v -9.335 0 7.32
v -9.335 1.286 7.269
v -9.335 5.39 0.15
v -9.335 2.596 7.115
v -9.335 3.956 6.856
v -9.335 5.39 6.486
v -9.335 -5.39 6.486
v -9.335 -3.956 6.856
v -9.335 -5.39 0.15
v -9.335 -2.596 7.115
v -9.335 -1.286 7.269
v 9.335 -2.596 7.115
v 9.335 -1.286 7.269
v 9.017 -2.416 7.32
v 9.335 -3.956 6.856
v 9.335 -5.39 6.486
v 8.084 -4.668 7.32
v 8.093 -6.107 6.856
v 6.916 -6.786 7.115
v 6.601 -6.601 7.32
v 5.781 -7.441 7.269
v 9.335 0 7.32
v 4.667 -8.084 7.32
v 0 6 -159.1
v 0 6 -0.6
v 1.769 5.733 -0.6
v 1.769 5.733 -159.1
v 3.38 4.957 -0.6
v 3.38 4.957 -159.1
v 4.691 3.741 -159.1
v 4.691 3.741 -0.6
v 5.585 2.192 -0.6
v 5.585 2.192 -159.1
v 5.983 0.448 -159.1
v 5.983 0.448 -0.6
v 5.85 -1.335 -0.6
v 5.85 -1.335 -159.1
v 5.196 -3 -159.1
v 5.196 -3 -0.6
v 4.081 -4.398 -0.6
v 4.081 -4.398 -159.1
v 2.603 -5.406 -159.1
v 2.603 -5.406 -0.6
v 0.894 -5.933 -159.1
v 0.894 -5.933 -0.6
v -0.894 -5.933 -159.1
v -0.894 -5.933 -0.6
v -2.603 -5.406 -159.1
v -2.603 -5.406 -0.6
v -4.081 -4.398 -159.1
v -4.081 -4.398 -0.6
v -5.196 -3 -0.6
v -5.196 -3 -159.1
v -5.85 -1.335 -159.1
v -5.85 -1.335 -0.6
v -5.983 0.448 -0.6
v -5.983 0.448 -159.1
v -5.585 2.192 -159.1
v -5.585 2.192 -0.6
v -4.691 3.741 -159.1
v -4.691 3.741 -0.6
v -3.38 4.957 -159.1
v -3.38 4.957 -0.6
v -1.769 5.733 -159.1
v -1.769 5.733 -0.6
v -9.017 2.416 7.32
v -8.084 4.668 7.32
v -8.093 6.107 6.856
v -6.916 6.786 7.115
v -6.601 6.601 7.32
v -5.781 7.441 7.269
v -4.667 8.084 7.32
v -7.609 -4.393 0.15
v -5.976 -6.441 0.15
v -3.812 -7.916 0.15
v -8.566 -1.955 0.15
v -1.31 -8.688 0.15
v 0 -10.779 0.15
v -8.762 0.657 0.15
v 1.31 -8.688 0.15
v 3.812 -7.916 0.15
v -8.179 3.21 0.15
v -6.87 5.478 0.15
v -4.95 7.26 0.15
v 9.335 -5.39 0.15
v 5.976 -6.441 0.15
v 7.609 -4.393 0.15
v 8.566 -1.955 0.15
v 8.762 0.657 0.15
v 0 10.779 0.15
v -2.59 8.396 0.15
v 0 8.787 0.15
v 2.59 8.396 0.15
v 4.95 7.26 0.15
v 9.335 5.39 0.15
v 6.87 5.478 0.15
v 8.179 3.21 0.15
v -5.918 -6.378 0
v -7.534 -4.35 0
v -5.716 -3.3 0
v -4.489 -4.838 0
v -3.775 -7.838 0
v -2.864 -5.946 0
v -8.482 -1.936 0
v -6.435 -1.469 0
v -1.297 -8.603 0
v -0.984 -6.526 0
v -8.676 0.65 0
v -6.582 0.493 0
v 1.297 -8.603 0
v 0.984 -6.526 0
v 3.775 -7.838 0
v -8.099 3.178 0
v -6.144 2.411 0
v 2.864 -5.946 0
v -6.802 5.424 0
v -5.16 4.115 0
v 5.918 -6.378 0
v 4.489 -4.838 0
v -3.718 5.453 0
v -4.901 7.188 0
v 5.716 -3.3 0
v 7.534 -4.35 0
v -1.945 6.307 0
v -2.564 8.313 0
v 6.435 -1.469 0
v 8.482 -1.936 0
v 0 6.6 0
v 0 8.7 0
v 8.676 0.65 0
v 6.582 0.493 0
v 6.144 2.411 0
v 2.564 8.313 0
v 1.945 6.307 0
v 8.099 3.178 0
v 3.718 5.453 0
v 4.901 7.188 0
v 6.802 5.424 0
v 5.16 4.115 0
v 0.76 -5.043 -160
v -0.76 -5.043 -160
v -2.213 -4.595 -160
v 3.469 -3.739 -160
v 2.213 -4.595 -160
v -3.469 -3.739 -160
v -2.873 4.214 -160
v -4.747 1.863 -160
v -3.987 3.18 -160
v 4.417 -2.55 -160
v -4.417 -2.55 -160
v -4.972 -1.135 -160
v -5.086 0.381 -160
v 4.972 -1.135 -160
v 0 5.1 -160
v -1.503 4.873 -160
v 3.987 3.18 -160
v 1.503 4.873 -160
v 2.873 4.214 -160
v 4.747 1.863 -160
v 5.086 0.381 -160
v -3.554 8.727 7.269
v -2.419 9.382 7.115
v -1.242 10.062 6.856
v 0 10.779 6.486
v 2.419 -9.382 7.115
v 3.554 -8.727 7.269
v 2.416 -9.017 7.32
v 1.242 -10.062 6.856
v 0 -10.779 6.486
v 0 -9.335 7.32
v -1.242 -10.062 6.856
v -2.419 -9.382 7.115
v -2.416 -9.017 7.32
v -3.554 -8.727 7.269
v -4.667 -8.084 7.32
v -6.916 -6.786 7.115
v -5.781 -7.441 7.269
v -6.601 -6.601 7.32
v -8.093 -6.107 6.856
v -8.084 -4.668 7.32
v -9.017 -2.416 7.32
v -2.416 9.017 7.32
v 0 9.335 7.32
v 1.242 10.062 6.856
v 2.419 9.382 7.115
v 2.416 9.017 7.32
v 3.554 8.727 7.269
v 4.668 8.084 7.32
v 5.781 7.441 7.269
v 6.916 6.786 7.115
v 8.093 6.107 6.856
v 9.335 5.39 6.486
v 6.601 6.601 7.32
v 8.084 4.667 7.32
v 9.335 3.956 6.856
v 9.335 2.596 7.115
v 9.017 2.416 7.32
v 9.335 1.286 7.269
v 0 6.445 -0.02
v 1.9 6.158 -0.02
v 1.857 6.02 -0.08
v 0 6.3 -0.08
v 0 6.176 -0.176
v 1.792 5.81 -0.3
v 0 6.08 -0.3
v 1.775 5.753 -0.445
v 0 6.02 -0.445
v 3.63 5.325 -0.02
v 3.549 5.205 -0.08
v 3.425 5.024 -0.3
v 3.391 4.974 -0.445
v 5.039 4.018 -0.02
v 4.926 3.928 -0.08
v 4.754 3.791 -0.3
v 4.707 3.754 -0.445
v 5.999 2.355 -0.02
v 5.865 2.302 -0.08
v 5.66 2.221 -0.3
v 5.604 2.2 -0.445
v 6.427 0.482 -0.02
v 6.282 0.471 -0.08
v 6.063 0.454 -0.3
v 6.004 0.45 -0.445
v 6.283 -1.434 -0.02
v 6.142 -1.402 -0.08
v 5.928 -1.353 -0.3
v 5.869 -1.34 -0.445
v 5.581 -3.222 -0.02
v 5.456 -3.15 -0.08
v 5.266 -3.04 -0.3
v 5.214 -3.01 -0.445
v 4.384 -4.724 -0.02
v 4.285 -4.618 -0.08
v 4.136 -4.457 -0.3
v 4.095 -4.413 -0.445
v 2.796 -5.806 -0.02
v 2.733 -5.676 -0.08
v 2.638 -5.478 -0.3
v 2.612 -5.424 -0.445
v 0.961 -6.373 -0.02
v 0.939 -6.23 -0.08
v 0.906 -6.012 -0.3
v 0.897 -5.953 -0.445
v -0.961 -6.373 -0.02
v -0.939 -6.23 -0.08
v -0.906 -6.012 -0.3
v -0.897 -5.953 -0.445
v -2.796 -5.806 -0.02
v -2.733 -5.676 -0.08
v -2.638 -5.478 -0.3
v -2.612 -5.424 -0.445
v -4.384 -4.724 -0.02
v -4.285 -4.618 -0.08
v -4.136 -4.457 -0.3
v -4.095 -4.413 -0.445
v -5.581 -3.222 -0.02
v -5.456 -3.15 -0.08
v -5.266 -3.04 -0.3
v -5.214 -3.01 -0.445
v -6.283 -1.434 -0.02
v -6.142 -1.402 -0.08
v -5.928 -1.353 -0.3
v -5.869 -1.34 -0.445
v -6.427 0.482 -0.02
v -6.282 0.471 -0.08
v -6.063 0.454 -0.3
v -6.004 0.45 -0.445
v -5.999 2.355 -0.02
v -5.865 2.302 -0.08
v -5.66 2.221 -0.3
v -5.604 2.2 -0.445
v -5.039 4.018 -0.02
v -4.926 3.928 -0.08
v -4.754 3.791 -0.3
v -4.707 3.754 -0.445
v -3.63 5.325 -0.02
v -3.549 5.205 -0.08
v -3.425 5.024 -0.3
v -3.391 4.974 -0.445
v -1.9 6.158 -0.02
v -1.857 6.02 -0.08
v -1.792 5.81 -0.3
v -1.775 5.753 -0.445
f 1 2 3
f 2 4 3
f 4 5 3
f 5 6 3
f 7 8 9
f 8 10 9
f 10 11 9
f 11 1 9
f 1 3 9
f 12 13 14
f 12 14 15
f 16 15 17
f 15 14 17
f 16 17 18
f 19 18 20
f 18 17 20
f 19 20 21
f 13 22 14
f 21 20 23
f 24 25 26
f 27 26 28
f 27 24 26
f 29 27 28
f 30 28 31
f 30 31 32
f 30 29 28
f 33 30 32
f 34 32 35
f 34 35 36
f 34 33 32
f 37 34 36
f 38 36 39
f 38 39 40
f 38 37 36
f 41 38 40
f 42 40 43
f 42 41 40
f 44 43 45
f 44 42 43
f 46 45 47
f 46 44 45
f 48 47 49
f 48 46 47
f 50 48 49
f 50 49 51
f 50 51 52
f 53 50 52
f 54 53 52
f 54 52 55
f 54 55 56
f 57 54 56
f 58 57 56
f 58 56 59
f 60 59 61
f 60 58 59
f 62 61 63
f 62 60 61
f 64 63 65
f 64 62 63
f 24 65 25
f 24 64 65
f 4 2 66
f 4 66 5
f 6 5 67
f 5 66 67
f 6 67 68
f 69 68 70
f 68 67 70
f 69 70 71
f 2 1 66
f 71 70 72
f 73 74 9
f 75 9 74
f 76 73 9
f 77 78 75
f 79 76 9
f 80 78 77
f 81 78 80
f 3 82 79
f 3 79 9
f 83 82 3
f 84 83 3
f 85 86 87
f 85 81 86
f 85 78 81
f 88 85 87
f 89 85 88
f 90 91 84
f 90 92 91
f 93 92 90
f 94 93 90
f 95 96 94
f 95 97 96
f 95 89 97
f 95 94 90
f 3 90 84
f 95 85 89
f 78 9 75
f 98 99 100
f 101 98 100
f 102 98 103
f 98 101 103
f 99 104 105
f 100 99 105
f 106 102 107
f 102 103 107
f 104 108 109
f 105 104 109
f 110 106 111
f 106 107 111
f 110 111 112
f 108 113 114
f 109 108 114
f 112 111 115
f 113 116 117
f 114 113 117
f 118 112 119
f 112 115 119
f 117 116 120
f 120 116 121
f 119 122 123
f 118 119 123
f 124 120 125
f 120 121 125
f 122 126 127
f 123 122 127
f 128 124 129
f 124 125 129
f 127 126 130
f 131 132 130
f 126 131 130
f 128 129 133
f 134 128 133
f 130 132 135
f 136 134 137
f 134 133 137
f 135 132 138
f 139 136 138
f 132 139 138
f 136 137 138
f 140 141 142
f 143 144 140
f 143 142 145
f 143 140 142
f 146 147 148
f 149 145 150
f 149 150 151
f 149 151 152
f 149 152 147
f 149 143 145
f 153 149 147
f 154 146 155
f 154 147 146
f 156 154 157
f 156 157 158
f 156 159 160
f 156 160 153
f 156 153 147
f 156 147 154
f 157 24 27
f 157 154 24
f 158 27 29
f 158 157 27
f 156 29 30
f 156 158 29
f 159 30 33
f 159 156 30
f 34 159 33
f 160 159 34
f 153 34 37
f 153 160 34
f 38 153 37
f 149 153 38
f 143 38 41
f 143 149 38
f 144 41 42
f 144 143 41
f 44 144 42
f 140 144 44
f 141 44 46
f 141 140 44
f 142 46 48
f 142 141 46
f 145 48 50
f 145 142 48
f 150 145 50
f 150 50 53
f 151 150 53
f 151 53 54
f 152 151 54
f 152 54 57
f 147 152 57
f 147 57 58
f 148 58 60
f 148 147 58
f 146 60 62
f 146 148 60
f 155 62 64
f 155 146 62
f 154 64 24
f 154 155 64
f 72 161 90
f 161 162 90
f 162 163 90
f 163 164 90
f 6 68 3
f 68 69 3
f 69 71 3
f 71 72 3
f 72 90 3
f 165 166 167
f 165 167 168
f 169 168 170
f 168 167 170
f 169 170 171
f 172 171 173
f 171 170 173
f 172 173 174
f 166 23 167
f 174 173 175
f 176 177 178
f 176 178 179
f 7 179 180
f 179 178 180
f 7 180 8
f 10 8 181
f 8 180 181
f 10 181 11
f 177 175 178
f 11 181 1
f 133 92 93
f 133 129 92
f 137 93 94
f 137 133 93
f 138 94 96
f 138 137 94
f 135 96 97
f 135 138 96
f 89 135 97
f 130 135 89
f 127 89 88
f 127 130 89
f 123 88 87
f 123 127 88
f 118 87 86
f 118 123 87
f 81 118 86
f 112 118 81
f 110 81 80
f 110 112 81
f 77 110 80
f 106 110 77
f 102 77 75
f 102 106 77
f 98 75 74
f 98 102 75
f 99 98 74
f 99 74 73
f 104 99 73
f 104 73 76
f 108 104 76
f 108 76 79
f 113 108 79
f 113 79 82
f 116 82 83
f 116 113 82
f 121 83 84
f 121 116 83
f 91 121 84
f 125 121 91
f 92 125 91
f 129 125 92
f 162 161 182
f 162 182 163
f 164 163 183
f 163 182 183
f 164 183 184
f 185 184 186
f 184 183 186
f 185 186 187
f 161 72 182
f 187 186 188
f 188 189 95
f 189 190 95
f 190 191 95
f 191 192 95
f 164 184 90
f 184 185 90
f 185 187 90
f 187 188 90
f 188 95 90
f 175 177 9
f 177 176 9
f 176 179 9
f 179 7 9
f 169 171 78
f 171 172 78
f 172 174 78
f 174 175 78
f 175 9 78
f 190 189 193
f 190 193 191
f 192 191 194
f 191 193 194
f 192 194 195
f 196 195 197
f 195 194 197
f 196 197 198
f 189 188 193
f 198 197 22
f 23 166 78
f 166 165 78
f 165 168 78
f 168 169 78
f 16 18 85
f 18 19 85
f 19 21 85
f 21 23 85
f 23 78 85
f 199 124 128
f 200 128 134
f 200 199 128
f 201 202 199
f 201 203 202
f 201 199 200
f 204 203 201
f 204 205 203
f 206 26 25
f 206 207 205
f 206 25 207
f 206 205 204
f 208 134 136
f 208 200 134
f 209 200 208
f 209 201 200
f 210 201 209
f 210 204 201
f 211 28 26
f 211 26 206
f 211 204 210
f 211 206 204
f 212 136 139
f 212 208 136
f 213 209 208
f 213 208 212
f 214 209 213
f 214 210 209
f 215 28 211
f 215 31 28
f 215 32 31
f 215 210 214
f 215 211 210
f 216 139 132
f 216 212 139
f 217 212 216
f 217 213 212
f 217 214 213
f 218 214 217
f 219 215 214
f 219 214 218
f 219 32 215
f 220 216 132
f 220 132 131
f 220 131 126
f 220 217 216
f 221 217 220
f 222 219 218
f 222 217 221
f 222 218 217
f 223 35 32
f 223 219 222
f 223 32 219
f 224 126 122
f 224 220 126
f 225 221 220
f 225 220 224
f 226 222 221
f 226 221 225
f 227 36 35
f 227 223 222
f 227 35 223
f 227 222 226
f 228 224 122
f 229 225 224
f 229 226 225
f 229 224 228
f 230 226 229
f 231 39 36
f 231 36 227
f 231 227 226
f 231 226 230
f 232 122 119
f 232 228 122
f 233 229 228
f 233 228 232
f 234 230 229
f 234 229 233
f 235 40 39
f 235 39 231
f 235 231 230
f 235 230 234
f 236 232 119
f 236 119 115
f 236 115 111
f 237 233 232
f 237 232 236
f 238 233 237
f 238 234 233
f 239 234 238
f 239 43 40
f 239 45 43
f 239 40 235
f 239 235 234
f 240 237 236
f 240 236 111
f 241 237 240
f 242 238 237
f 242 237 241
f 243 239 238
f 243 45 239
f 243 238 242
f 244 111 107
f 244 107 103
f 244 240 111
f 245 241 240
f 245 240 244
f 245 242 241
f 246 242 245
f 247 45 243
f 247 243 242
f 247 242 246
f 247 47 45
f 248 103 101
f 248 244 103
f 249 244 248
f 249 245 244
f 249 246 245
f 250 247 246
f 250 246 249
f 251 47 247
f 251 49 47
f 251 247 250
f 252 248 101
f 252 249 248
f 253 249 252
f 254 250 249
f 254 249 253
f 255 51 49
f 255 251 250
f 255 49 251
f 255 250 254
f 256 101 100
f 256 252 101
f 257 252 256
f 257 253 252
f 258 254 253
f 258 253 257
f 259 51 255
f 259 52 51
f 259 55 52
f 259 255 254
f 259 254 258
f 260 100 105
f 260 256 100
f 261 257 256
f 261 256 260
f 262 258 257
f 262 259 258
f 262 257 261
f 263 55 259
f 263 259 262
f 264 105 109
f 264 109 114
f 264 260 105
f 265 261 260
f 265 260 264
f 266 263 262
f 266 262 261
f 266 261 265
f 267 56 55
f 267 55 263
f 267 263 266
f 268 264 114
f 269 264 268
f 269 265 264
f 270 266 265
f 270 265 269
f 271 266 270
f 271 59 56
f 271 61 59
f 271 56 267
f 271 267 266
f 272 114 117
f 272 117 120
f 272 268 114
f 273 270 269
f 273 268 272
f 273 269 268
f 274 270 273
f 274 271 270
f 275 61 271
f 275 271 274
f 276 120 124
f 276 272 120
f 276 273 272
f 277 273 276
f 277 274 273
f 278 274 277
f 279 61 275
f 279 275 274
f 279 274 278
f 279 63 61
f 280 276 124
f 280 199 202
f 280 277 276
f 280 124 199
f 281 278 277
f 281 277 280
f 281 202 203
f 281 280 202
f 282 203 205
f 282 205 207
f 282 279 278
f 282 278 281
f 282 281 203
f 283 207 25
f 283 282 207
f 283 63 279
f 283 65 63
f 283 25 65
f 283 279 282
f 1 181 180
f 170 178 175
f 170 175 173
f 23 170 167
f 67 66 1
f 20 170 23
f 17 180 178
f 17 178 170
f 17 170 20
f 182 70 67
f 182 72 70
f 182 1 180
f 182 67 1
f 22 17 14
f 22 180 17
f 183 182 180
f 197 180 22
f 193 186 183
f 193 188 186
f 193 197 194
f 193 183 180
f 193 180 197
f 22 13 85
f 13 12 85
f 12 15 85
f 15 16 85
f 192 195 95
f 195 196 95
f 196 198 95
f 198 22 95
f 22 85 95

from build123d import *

# Parameters (mm, degrees)
BOSS_EXTRUDE1_DEPTH = 7.32


with BuildPart() as part:
    # Sketch1 → Boss-Extrude1 (new body)
    with BuildSketch(Plane.XY):
        Polygon((0, 10.779129526), (-9.335, 5.389564763), (-9.335, -5.389564763), (0, -10.779129526), (9.335, -5.389564763), (9.335, 5.389564763), align=None)
    extrude(amount=BOSS_EXTRUDE1_DEPTH)

    # Sketch2 → Revolve1 (revolve)
    with BuildSketch(Plane(origin=(0, 0, 0), x_dir=(0, 0, -1), z_dir=(1, 0, 0))):
        with BuildLine():
            Line((0, 0), (0, 6.6))
            ThreePointArc((0, 6.6), (0.175735931, 6.175735931), (0.6, 6))
            Line((0.6, 6), (159.1, 6))
            Line((159.1, 6), (160, 5.1))
            Line((160, 5.1), (160, 0))
            Line((160, 0), (0, 0))
        make_face()
    revolve(axis=Axis((0, 0, 0), (0, 0, -1)))

    # Sketch3 → Cut-Revolve1 (revolve, cut)
    with BuildSketch(Plane(origin=(0, 0, 0), x_dir=(0, 0, -1), z_dir=(1, 0, 0))):
        Polygon((-7.32, 10.779129526), (-6.48623143, 10.779129526), (-7.32, 9.335), align=None)
        Polygon((-0.15, 10.779129526), (-0.15, 8.78660254), (0, 8.7), (0, 10.779129526), align=None)
    revolve(axis=Axis((0, 0, 12.204941078), (0, 0, -1)), mode=Mode.SUBTRACT)


solid = part.part
